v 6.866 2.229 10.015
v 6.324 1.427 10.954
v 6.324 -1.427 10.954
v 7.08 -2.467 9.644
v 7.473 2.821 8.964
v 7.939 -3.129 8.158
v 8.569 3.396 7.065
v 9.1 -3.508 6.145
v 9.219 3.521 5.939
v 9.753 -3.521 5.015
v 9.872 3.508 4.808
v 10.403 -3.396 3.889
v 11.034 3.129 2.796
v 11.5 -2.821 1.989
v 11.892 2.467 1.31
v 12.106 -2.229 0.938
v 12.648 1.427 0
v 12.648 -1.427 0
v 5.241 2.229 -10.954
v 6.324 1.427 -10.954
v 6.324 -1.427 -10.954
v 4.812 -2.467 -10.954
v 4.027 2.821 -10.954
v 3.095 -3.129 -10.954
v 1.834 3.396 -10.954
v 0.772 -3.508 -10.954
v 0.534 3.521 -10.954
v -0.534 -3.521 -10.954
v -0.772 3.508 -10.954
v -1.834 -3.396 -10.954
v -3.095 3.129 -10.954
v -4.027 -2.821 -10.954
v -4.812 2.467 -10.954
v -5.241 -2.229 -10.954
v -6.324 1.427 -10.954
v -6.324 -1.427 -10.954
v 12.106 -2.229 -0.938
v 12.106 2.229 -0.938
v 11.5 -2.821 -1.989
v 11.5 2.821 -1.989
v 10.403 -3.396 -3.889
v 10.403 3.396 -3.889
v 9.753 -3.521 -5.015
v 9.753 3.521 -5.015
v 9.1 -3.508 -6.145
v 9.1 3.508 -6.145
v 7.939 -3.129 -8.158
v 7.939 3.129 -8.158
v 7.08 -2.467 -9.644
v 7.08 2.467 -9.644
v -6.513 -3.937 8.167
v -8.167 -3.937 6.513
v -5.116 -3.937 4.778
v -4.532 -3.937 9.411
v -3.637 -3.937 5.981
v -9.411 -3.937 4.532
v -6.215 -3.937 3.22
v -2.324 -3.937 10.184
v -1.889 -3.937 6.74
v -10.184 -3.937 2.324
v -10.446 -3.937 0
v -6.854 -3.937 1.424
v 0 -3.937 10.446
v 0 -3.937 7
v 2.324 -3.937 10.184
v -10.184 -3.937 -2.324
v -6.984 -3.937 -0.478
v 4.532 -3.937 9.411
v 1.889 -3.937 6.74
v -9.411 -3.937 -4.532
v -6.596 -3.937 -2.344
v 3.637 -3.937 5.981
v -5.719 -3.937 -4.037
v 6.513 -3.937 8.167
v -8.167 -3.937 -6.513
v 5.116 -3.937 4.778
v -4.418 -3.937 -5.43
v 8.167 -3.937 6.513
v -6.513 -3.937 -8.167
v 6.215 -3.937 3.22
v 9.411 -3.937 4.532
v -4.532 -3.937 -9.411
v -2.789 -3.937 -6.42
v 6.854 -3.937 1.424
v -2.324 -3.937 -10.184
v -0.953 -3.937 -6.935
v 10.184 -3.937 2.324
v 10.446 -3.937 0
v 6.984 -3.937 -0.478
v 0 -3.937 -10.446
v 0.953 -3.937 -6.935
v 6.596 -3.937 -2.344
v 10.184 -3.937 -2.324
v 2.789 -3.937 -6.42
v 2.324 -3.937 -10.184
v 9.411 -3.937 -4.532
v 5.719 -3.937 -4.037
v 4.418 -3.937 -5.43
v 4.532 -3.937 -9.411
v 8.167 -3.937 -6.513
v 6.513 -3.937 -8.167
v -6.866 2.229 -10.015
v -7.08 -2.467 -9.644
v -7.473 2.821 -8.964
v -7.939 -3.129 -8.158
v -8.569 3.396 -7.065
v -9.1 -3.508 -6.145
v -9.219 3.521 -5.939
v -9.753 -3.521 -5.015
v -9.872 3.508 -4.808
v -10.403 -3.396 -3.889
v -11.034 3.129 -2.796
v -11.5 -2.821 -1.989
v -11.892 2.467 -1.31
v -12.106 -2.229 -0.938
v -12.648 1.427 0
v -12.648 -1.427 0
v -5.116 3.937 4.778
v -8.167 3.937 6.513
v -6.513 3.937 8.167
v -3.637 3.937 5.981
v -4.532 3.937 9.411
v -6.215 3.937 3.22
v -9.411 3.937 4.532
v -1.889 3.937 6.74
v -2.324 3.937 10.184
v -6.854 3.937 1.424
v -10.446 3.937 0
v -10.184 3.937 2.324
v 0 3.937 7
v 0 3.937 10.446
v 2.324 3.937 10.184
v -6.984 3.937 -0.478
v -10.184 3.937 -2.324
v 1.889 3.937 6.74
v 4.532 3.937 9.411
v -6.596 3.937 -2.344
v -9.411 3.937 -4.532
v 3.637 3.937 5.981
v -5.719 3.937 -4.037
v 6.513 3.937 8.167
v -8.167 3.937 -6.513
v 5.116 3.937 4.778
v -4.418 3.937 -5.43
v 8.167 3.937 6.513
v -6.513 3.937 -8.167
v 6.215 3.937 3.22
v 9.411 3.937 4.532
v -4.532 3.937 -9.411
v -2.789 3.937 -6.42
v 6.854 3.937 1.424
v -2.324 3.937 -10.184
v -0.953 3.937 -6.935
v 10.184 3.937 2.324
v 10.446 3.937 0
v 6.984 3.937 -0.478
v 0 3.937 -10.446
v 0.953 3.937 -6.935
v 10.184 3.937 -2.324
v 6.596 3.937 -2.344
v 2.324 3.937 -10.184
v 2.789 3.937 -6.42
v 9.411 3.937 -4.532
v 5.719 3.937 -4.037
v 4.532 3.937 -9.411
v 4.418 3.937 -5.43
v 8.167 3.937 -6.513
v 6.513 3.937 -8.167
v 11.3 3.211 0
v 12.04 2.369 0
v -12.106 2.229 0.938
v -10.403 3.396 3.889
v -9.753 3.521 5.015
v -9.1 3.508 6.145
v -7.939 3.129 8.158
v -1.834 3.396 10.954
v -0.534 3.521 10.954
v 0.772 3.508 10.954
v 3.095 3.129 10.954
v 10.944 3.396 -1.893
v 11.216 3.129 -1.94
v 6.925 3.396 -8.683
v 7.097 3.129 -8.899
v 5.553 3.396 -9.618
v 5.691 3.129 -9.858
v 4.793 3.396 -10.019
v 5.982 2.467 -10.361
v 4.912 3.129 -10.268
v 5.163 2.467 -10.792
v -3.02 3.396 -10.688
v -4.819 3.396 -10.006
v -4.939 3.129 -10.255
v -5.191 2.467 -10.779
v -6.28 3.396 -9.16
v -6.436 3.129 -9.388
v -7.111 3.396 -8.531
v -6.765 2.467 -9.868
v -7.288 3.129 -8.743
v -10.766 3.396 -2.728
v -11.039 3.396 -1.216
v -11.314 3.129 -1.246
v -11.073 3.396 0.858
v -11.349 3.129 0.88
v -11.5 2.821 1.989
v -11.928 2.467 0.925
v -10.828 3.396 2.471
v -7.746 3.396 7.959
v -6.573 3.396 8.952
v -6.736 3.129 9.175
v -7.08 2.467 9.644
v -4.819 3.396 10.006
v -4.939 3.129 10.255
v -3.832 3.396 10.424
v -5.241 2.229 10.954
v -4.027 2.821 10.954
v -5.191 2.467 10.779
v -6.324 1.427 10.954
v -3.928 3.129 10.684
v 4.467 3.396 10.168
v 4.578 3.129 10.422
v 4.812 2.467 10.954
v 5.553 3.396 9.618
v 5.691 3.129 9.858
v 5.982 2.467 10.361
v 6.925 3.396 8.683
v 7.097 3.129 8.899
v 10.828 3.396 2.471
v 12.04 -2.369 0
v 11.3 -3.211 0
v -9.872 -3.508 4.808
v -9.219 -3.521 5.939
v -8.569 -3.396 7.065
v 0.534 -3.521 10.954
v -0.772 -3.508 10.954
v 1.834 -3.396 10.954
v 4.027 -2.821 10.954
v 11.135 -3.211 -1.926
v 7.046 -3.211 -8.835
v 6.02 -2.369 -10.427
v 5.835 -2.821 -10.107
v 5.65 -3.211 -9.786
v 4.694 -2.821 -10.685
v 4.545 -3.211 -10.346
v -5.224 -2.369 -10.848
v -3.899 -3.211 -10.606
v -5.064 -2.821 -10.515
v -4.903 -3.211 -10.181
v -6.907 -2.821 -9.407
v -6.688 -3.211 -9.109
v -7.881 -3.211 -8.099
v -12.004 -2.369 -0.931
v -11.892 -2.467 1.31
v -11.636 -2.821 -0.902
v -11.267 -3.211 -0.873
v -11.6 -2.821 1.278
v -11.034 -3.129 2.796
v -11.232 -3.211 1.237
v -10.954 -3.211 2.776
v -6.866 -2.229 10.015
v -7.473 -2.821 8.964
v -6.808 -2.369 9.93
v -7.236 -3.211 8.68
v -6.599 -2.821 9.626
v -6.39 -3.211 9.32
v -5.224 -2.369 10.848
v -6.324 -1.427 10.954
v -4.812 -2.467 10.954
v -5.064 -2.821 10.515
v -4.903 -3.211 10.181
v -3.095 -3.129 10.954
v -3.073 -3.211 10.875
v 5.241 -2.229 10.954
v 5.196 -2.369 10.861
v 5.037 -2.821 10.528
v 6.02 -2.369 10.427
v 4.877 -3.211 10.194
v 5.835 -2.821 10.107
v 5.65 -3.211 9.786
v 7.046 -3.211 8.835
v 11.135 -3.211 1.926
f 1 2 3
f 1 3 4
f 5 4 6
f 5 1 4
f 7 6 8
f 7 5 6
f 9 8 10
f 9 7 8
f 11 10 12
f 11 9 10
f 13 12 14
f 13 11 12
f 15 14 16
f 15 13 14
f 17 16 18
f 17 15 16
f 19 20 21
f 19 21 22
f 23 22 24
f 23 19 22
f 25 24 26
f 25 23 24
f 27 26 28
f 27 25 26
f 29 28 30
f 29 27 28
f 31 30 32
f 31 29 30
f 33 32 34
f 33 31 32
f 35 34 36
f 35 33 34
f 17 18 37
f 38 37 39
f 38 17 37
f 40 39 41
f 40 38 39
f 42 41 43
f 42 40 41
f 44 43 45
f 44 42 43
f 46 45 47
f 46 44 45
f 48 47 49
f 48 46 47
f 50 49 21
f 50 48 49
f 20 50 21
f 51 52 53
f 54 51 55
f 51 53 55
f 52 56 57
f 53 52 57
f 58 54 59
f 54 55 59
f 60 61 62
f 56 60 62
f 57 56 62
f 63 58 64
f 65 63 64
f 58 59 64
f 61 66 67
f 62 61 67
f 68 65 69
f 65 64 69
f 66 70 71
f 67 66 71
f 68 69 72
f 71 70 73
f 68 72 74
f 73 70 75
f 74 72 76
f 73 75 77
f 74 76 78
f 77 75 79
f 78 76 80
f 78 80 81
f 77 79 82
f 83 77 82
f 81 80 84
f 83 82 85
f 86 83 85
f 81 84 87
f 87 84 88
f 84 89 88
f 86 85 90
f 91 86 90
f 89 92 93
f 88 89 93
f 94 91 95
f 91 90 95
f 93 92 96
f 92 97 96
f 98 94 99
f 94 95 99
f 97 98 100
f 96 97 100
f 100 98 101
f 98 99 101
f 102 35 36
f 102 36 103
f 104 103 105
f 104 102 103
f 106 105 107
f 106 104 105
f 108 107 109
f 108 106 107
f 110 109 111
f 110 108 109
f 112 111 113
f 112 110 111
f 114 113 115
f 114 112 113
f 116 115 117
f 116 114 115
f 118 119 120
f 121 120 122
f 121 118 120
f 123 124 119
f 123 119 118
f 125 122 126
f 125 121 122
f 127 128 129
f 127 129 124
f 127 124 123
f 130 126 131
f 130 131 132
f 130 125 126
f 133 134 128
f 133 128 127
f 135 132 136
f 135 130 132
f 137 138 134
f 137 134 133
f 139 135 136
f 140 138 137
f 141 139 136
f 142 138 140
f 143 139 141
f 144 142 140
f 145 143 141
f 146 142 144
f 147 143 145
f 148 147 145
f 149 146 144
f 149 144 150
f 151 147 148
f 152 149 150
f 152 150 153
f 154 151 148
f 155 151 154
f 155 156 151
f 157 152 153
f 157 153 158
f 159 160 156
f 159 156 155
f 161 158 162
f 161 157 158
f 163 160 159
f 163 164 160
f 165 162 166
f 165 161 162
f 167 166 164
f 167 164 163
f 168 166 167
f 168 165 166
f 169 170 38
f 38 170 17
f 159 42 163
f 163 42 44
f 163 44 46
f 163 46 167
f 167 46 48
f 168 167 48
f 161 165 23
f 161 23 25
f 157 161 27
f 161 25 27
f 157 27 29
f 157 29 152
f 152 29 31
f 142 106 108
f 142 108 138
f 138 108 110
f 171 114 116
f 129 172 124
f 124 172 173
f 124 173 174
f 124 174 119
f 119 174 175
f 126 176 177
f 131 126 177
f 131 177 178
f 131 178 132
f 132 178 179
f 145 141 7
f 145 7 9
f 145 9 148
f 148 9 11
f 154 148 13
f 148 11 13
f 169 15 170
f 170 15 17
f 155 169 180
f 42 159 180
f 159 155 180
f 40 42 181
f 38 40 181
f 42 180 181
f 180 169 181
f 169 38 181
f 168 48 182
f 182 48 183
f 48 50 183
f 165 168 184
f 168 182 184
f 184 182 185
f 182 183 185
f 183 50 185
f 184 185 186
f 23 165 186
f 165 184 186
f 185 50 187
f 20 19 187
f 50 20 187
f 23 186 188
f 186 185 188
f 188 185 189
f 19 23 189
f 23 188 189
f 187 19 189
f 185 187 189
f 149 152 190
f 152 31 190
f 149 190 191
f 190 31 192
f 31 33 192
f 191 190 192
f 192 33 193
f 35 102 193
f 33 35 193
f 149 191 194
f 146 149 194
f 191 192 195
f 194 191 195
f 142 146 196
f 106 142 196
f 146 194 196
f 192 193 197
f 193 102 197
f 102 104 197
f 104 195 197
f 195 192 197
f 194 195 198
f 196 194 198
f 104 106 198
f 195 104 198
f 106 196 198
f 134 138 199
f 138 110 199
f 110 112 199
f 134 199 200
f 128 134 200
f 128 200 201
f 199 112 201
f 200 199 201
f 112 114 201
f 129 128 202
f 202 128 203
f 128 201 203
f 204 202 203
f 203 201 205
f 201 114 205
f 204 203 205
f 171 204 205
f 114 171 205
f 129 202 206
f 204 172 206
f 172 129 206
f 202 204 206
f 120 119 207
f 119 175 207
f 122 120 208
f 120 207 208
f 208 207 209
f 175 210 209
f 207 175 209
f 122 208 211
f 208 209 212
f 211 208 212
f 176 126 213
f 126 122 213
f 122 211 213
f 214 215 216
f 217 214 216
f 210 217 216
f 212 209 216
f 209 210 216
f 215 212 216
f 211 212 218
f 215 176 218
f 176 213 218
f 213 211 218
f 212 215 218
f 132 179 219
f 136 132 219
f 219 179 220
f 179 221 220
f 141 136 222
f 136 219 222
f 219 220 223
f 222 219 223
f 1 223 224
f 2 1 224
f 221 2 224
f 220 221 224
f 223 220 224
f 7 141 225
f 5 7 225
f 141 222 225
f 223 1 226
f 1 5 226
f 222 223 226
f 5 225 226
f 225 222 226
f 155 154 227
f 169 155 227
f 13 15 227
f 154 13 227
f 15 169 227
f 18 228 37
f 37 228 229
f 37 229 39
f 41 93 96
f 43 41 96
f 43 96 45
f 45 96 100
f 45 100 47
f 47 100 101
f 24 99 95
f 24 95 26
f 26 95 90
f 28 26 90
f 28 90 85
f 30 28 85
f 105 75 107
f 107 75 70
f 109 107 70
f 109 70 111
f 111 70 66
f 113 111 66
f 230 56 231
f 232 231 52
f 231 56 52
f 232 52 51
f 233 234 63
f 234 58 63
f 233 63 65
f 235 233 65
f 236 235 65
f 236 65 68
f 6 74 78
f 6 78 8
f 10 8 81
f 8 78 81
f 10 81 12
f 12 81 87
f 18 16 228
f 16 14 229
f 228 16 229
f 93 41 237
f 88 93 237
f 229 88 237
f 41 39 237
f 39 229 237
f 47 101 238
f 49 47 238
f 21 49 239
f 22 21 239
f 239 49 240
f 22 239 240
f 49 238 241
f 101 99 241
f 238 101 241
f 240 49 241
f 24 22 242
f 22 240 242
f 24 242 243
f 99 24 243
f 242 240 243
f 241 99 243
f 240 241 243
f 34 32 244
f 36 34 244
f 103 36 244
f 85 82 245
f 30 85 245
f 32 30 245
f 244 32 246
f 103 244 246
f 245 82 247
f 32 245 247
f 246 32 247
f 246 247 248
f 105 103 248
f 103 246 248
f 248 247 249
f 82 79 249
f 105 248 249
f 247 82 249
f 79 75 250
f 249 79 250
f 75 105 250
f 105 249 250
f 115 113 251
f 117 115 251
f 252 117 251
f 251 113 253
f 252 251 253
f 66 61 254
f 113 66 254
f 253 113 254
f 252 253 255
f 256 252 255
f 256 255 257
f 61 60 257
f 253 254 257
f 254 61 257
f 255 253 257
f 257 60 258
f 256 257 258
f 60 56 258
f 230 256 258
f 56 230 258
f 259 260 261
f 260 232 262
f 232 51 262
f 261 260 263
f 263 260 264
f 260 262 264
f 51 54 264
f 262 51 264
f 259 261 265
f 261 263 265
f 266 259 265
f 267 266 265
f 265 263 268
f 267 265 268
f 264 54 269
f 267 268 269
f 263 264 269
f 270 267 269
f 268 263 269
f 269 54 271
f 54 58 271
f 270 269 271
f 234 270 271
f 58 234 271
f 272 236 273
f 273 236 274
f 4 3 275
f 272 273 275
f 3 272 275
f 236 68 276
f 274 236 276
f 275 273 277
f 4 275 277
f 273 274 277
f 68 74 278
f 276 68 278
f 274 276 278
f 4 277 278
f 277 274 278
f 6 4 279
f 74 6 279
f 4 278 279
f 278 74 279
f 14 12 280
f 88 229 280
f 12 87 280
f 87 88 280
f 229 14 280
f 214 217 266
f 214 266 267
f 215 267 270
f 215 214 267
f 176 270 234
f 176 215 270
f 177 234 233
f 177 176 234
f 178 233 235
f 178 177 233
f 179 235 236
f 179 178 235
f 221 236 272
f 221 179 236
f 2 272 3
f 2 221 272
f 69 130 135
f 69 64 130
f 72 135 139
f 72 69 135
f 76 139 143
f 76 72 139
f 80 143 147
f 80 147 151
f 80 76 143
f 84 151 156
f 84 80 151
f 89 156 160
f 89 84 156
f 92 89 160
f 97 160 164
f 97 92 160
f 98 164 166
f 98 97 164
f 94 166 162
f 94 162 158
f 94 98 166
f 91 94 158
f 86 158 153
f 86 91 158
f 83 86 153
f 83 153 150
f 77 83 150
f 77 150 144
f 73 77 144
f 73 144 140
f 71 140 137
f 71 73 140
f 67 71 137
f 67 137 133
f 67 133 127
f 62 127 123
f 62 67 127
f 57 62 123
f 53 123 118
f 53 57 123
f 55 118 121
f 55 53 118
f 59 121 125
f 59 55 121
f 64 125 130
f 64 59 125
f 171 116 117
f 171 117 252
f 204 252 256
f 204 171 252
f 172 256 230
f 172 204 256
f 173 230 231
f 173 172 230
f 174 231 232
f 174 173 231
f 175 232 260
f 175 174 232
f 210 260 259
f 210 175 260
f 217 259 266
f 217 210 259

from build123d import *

# Parameters (mm, degrees)
SKETCH1_R           = 7
BOSS_EXTRUDE1_DEPTH = 3.937


# Read off the part's stored shape, not the designer's step: Cut-Revolve-Thin1
with BuildPart() as part:
    # Sketch1 → Boss-Extrude1 (new, symmetric)
    with BuildSketch(Plane(origin=(0, 0, 0), x_dir=(1, 0, 0), z_dir=(0, 1, 0))):
        Polygon((6.324150511, 10.95375), (-6.324150511, 10.95375), (-12.648301022, 0), (-6.324150511, -10.95375), (6.324150511, -10.95375), (12.648301022, 0), align=None)
        with Locations(Location((0, 0, 0), (0, 0, 270))):
            Circle(SKETCH1_R, mode=Mode.SUBTRACT)
    extrude(amount=BOSS_EXTRUDE1_DEPTH, both=True)

    # Cut-Revolve-Thin1 outline → Cut-Revolve-Thin1 (revolve, cut)
    with BuildSketch(Plane.XY):
        with BuildLine():
            ThreePointArc((12.648306093, -1.426964265), (11.685557296, -2.803541534), (10.44575, -3.937))
            Line((10.44575, -3.937), (12.648306093, -3.937))
            Line((12.648306093, -3.937), (12.648306093, -1.426964265))
        make_face()
        with BuildLine():
            ThreePointArc((10.44575, 3.937), (11.685557296, 2.803541534), (12.648306093, 1.426964265))
            Line((12.648306093, 1.426964265), (12.648306093, 3.937))
            Line((12.648306093, 3.937), (10.44575, 3.937))
        make_face()
    revolve(axis=Axis((0, 0, 0), (0, 1, 0)), mode=Mode.SUBTRACT)


solid = part.part
